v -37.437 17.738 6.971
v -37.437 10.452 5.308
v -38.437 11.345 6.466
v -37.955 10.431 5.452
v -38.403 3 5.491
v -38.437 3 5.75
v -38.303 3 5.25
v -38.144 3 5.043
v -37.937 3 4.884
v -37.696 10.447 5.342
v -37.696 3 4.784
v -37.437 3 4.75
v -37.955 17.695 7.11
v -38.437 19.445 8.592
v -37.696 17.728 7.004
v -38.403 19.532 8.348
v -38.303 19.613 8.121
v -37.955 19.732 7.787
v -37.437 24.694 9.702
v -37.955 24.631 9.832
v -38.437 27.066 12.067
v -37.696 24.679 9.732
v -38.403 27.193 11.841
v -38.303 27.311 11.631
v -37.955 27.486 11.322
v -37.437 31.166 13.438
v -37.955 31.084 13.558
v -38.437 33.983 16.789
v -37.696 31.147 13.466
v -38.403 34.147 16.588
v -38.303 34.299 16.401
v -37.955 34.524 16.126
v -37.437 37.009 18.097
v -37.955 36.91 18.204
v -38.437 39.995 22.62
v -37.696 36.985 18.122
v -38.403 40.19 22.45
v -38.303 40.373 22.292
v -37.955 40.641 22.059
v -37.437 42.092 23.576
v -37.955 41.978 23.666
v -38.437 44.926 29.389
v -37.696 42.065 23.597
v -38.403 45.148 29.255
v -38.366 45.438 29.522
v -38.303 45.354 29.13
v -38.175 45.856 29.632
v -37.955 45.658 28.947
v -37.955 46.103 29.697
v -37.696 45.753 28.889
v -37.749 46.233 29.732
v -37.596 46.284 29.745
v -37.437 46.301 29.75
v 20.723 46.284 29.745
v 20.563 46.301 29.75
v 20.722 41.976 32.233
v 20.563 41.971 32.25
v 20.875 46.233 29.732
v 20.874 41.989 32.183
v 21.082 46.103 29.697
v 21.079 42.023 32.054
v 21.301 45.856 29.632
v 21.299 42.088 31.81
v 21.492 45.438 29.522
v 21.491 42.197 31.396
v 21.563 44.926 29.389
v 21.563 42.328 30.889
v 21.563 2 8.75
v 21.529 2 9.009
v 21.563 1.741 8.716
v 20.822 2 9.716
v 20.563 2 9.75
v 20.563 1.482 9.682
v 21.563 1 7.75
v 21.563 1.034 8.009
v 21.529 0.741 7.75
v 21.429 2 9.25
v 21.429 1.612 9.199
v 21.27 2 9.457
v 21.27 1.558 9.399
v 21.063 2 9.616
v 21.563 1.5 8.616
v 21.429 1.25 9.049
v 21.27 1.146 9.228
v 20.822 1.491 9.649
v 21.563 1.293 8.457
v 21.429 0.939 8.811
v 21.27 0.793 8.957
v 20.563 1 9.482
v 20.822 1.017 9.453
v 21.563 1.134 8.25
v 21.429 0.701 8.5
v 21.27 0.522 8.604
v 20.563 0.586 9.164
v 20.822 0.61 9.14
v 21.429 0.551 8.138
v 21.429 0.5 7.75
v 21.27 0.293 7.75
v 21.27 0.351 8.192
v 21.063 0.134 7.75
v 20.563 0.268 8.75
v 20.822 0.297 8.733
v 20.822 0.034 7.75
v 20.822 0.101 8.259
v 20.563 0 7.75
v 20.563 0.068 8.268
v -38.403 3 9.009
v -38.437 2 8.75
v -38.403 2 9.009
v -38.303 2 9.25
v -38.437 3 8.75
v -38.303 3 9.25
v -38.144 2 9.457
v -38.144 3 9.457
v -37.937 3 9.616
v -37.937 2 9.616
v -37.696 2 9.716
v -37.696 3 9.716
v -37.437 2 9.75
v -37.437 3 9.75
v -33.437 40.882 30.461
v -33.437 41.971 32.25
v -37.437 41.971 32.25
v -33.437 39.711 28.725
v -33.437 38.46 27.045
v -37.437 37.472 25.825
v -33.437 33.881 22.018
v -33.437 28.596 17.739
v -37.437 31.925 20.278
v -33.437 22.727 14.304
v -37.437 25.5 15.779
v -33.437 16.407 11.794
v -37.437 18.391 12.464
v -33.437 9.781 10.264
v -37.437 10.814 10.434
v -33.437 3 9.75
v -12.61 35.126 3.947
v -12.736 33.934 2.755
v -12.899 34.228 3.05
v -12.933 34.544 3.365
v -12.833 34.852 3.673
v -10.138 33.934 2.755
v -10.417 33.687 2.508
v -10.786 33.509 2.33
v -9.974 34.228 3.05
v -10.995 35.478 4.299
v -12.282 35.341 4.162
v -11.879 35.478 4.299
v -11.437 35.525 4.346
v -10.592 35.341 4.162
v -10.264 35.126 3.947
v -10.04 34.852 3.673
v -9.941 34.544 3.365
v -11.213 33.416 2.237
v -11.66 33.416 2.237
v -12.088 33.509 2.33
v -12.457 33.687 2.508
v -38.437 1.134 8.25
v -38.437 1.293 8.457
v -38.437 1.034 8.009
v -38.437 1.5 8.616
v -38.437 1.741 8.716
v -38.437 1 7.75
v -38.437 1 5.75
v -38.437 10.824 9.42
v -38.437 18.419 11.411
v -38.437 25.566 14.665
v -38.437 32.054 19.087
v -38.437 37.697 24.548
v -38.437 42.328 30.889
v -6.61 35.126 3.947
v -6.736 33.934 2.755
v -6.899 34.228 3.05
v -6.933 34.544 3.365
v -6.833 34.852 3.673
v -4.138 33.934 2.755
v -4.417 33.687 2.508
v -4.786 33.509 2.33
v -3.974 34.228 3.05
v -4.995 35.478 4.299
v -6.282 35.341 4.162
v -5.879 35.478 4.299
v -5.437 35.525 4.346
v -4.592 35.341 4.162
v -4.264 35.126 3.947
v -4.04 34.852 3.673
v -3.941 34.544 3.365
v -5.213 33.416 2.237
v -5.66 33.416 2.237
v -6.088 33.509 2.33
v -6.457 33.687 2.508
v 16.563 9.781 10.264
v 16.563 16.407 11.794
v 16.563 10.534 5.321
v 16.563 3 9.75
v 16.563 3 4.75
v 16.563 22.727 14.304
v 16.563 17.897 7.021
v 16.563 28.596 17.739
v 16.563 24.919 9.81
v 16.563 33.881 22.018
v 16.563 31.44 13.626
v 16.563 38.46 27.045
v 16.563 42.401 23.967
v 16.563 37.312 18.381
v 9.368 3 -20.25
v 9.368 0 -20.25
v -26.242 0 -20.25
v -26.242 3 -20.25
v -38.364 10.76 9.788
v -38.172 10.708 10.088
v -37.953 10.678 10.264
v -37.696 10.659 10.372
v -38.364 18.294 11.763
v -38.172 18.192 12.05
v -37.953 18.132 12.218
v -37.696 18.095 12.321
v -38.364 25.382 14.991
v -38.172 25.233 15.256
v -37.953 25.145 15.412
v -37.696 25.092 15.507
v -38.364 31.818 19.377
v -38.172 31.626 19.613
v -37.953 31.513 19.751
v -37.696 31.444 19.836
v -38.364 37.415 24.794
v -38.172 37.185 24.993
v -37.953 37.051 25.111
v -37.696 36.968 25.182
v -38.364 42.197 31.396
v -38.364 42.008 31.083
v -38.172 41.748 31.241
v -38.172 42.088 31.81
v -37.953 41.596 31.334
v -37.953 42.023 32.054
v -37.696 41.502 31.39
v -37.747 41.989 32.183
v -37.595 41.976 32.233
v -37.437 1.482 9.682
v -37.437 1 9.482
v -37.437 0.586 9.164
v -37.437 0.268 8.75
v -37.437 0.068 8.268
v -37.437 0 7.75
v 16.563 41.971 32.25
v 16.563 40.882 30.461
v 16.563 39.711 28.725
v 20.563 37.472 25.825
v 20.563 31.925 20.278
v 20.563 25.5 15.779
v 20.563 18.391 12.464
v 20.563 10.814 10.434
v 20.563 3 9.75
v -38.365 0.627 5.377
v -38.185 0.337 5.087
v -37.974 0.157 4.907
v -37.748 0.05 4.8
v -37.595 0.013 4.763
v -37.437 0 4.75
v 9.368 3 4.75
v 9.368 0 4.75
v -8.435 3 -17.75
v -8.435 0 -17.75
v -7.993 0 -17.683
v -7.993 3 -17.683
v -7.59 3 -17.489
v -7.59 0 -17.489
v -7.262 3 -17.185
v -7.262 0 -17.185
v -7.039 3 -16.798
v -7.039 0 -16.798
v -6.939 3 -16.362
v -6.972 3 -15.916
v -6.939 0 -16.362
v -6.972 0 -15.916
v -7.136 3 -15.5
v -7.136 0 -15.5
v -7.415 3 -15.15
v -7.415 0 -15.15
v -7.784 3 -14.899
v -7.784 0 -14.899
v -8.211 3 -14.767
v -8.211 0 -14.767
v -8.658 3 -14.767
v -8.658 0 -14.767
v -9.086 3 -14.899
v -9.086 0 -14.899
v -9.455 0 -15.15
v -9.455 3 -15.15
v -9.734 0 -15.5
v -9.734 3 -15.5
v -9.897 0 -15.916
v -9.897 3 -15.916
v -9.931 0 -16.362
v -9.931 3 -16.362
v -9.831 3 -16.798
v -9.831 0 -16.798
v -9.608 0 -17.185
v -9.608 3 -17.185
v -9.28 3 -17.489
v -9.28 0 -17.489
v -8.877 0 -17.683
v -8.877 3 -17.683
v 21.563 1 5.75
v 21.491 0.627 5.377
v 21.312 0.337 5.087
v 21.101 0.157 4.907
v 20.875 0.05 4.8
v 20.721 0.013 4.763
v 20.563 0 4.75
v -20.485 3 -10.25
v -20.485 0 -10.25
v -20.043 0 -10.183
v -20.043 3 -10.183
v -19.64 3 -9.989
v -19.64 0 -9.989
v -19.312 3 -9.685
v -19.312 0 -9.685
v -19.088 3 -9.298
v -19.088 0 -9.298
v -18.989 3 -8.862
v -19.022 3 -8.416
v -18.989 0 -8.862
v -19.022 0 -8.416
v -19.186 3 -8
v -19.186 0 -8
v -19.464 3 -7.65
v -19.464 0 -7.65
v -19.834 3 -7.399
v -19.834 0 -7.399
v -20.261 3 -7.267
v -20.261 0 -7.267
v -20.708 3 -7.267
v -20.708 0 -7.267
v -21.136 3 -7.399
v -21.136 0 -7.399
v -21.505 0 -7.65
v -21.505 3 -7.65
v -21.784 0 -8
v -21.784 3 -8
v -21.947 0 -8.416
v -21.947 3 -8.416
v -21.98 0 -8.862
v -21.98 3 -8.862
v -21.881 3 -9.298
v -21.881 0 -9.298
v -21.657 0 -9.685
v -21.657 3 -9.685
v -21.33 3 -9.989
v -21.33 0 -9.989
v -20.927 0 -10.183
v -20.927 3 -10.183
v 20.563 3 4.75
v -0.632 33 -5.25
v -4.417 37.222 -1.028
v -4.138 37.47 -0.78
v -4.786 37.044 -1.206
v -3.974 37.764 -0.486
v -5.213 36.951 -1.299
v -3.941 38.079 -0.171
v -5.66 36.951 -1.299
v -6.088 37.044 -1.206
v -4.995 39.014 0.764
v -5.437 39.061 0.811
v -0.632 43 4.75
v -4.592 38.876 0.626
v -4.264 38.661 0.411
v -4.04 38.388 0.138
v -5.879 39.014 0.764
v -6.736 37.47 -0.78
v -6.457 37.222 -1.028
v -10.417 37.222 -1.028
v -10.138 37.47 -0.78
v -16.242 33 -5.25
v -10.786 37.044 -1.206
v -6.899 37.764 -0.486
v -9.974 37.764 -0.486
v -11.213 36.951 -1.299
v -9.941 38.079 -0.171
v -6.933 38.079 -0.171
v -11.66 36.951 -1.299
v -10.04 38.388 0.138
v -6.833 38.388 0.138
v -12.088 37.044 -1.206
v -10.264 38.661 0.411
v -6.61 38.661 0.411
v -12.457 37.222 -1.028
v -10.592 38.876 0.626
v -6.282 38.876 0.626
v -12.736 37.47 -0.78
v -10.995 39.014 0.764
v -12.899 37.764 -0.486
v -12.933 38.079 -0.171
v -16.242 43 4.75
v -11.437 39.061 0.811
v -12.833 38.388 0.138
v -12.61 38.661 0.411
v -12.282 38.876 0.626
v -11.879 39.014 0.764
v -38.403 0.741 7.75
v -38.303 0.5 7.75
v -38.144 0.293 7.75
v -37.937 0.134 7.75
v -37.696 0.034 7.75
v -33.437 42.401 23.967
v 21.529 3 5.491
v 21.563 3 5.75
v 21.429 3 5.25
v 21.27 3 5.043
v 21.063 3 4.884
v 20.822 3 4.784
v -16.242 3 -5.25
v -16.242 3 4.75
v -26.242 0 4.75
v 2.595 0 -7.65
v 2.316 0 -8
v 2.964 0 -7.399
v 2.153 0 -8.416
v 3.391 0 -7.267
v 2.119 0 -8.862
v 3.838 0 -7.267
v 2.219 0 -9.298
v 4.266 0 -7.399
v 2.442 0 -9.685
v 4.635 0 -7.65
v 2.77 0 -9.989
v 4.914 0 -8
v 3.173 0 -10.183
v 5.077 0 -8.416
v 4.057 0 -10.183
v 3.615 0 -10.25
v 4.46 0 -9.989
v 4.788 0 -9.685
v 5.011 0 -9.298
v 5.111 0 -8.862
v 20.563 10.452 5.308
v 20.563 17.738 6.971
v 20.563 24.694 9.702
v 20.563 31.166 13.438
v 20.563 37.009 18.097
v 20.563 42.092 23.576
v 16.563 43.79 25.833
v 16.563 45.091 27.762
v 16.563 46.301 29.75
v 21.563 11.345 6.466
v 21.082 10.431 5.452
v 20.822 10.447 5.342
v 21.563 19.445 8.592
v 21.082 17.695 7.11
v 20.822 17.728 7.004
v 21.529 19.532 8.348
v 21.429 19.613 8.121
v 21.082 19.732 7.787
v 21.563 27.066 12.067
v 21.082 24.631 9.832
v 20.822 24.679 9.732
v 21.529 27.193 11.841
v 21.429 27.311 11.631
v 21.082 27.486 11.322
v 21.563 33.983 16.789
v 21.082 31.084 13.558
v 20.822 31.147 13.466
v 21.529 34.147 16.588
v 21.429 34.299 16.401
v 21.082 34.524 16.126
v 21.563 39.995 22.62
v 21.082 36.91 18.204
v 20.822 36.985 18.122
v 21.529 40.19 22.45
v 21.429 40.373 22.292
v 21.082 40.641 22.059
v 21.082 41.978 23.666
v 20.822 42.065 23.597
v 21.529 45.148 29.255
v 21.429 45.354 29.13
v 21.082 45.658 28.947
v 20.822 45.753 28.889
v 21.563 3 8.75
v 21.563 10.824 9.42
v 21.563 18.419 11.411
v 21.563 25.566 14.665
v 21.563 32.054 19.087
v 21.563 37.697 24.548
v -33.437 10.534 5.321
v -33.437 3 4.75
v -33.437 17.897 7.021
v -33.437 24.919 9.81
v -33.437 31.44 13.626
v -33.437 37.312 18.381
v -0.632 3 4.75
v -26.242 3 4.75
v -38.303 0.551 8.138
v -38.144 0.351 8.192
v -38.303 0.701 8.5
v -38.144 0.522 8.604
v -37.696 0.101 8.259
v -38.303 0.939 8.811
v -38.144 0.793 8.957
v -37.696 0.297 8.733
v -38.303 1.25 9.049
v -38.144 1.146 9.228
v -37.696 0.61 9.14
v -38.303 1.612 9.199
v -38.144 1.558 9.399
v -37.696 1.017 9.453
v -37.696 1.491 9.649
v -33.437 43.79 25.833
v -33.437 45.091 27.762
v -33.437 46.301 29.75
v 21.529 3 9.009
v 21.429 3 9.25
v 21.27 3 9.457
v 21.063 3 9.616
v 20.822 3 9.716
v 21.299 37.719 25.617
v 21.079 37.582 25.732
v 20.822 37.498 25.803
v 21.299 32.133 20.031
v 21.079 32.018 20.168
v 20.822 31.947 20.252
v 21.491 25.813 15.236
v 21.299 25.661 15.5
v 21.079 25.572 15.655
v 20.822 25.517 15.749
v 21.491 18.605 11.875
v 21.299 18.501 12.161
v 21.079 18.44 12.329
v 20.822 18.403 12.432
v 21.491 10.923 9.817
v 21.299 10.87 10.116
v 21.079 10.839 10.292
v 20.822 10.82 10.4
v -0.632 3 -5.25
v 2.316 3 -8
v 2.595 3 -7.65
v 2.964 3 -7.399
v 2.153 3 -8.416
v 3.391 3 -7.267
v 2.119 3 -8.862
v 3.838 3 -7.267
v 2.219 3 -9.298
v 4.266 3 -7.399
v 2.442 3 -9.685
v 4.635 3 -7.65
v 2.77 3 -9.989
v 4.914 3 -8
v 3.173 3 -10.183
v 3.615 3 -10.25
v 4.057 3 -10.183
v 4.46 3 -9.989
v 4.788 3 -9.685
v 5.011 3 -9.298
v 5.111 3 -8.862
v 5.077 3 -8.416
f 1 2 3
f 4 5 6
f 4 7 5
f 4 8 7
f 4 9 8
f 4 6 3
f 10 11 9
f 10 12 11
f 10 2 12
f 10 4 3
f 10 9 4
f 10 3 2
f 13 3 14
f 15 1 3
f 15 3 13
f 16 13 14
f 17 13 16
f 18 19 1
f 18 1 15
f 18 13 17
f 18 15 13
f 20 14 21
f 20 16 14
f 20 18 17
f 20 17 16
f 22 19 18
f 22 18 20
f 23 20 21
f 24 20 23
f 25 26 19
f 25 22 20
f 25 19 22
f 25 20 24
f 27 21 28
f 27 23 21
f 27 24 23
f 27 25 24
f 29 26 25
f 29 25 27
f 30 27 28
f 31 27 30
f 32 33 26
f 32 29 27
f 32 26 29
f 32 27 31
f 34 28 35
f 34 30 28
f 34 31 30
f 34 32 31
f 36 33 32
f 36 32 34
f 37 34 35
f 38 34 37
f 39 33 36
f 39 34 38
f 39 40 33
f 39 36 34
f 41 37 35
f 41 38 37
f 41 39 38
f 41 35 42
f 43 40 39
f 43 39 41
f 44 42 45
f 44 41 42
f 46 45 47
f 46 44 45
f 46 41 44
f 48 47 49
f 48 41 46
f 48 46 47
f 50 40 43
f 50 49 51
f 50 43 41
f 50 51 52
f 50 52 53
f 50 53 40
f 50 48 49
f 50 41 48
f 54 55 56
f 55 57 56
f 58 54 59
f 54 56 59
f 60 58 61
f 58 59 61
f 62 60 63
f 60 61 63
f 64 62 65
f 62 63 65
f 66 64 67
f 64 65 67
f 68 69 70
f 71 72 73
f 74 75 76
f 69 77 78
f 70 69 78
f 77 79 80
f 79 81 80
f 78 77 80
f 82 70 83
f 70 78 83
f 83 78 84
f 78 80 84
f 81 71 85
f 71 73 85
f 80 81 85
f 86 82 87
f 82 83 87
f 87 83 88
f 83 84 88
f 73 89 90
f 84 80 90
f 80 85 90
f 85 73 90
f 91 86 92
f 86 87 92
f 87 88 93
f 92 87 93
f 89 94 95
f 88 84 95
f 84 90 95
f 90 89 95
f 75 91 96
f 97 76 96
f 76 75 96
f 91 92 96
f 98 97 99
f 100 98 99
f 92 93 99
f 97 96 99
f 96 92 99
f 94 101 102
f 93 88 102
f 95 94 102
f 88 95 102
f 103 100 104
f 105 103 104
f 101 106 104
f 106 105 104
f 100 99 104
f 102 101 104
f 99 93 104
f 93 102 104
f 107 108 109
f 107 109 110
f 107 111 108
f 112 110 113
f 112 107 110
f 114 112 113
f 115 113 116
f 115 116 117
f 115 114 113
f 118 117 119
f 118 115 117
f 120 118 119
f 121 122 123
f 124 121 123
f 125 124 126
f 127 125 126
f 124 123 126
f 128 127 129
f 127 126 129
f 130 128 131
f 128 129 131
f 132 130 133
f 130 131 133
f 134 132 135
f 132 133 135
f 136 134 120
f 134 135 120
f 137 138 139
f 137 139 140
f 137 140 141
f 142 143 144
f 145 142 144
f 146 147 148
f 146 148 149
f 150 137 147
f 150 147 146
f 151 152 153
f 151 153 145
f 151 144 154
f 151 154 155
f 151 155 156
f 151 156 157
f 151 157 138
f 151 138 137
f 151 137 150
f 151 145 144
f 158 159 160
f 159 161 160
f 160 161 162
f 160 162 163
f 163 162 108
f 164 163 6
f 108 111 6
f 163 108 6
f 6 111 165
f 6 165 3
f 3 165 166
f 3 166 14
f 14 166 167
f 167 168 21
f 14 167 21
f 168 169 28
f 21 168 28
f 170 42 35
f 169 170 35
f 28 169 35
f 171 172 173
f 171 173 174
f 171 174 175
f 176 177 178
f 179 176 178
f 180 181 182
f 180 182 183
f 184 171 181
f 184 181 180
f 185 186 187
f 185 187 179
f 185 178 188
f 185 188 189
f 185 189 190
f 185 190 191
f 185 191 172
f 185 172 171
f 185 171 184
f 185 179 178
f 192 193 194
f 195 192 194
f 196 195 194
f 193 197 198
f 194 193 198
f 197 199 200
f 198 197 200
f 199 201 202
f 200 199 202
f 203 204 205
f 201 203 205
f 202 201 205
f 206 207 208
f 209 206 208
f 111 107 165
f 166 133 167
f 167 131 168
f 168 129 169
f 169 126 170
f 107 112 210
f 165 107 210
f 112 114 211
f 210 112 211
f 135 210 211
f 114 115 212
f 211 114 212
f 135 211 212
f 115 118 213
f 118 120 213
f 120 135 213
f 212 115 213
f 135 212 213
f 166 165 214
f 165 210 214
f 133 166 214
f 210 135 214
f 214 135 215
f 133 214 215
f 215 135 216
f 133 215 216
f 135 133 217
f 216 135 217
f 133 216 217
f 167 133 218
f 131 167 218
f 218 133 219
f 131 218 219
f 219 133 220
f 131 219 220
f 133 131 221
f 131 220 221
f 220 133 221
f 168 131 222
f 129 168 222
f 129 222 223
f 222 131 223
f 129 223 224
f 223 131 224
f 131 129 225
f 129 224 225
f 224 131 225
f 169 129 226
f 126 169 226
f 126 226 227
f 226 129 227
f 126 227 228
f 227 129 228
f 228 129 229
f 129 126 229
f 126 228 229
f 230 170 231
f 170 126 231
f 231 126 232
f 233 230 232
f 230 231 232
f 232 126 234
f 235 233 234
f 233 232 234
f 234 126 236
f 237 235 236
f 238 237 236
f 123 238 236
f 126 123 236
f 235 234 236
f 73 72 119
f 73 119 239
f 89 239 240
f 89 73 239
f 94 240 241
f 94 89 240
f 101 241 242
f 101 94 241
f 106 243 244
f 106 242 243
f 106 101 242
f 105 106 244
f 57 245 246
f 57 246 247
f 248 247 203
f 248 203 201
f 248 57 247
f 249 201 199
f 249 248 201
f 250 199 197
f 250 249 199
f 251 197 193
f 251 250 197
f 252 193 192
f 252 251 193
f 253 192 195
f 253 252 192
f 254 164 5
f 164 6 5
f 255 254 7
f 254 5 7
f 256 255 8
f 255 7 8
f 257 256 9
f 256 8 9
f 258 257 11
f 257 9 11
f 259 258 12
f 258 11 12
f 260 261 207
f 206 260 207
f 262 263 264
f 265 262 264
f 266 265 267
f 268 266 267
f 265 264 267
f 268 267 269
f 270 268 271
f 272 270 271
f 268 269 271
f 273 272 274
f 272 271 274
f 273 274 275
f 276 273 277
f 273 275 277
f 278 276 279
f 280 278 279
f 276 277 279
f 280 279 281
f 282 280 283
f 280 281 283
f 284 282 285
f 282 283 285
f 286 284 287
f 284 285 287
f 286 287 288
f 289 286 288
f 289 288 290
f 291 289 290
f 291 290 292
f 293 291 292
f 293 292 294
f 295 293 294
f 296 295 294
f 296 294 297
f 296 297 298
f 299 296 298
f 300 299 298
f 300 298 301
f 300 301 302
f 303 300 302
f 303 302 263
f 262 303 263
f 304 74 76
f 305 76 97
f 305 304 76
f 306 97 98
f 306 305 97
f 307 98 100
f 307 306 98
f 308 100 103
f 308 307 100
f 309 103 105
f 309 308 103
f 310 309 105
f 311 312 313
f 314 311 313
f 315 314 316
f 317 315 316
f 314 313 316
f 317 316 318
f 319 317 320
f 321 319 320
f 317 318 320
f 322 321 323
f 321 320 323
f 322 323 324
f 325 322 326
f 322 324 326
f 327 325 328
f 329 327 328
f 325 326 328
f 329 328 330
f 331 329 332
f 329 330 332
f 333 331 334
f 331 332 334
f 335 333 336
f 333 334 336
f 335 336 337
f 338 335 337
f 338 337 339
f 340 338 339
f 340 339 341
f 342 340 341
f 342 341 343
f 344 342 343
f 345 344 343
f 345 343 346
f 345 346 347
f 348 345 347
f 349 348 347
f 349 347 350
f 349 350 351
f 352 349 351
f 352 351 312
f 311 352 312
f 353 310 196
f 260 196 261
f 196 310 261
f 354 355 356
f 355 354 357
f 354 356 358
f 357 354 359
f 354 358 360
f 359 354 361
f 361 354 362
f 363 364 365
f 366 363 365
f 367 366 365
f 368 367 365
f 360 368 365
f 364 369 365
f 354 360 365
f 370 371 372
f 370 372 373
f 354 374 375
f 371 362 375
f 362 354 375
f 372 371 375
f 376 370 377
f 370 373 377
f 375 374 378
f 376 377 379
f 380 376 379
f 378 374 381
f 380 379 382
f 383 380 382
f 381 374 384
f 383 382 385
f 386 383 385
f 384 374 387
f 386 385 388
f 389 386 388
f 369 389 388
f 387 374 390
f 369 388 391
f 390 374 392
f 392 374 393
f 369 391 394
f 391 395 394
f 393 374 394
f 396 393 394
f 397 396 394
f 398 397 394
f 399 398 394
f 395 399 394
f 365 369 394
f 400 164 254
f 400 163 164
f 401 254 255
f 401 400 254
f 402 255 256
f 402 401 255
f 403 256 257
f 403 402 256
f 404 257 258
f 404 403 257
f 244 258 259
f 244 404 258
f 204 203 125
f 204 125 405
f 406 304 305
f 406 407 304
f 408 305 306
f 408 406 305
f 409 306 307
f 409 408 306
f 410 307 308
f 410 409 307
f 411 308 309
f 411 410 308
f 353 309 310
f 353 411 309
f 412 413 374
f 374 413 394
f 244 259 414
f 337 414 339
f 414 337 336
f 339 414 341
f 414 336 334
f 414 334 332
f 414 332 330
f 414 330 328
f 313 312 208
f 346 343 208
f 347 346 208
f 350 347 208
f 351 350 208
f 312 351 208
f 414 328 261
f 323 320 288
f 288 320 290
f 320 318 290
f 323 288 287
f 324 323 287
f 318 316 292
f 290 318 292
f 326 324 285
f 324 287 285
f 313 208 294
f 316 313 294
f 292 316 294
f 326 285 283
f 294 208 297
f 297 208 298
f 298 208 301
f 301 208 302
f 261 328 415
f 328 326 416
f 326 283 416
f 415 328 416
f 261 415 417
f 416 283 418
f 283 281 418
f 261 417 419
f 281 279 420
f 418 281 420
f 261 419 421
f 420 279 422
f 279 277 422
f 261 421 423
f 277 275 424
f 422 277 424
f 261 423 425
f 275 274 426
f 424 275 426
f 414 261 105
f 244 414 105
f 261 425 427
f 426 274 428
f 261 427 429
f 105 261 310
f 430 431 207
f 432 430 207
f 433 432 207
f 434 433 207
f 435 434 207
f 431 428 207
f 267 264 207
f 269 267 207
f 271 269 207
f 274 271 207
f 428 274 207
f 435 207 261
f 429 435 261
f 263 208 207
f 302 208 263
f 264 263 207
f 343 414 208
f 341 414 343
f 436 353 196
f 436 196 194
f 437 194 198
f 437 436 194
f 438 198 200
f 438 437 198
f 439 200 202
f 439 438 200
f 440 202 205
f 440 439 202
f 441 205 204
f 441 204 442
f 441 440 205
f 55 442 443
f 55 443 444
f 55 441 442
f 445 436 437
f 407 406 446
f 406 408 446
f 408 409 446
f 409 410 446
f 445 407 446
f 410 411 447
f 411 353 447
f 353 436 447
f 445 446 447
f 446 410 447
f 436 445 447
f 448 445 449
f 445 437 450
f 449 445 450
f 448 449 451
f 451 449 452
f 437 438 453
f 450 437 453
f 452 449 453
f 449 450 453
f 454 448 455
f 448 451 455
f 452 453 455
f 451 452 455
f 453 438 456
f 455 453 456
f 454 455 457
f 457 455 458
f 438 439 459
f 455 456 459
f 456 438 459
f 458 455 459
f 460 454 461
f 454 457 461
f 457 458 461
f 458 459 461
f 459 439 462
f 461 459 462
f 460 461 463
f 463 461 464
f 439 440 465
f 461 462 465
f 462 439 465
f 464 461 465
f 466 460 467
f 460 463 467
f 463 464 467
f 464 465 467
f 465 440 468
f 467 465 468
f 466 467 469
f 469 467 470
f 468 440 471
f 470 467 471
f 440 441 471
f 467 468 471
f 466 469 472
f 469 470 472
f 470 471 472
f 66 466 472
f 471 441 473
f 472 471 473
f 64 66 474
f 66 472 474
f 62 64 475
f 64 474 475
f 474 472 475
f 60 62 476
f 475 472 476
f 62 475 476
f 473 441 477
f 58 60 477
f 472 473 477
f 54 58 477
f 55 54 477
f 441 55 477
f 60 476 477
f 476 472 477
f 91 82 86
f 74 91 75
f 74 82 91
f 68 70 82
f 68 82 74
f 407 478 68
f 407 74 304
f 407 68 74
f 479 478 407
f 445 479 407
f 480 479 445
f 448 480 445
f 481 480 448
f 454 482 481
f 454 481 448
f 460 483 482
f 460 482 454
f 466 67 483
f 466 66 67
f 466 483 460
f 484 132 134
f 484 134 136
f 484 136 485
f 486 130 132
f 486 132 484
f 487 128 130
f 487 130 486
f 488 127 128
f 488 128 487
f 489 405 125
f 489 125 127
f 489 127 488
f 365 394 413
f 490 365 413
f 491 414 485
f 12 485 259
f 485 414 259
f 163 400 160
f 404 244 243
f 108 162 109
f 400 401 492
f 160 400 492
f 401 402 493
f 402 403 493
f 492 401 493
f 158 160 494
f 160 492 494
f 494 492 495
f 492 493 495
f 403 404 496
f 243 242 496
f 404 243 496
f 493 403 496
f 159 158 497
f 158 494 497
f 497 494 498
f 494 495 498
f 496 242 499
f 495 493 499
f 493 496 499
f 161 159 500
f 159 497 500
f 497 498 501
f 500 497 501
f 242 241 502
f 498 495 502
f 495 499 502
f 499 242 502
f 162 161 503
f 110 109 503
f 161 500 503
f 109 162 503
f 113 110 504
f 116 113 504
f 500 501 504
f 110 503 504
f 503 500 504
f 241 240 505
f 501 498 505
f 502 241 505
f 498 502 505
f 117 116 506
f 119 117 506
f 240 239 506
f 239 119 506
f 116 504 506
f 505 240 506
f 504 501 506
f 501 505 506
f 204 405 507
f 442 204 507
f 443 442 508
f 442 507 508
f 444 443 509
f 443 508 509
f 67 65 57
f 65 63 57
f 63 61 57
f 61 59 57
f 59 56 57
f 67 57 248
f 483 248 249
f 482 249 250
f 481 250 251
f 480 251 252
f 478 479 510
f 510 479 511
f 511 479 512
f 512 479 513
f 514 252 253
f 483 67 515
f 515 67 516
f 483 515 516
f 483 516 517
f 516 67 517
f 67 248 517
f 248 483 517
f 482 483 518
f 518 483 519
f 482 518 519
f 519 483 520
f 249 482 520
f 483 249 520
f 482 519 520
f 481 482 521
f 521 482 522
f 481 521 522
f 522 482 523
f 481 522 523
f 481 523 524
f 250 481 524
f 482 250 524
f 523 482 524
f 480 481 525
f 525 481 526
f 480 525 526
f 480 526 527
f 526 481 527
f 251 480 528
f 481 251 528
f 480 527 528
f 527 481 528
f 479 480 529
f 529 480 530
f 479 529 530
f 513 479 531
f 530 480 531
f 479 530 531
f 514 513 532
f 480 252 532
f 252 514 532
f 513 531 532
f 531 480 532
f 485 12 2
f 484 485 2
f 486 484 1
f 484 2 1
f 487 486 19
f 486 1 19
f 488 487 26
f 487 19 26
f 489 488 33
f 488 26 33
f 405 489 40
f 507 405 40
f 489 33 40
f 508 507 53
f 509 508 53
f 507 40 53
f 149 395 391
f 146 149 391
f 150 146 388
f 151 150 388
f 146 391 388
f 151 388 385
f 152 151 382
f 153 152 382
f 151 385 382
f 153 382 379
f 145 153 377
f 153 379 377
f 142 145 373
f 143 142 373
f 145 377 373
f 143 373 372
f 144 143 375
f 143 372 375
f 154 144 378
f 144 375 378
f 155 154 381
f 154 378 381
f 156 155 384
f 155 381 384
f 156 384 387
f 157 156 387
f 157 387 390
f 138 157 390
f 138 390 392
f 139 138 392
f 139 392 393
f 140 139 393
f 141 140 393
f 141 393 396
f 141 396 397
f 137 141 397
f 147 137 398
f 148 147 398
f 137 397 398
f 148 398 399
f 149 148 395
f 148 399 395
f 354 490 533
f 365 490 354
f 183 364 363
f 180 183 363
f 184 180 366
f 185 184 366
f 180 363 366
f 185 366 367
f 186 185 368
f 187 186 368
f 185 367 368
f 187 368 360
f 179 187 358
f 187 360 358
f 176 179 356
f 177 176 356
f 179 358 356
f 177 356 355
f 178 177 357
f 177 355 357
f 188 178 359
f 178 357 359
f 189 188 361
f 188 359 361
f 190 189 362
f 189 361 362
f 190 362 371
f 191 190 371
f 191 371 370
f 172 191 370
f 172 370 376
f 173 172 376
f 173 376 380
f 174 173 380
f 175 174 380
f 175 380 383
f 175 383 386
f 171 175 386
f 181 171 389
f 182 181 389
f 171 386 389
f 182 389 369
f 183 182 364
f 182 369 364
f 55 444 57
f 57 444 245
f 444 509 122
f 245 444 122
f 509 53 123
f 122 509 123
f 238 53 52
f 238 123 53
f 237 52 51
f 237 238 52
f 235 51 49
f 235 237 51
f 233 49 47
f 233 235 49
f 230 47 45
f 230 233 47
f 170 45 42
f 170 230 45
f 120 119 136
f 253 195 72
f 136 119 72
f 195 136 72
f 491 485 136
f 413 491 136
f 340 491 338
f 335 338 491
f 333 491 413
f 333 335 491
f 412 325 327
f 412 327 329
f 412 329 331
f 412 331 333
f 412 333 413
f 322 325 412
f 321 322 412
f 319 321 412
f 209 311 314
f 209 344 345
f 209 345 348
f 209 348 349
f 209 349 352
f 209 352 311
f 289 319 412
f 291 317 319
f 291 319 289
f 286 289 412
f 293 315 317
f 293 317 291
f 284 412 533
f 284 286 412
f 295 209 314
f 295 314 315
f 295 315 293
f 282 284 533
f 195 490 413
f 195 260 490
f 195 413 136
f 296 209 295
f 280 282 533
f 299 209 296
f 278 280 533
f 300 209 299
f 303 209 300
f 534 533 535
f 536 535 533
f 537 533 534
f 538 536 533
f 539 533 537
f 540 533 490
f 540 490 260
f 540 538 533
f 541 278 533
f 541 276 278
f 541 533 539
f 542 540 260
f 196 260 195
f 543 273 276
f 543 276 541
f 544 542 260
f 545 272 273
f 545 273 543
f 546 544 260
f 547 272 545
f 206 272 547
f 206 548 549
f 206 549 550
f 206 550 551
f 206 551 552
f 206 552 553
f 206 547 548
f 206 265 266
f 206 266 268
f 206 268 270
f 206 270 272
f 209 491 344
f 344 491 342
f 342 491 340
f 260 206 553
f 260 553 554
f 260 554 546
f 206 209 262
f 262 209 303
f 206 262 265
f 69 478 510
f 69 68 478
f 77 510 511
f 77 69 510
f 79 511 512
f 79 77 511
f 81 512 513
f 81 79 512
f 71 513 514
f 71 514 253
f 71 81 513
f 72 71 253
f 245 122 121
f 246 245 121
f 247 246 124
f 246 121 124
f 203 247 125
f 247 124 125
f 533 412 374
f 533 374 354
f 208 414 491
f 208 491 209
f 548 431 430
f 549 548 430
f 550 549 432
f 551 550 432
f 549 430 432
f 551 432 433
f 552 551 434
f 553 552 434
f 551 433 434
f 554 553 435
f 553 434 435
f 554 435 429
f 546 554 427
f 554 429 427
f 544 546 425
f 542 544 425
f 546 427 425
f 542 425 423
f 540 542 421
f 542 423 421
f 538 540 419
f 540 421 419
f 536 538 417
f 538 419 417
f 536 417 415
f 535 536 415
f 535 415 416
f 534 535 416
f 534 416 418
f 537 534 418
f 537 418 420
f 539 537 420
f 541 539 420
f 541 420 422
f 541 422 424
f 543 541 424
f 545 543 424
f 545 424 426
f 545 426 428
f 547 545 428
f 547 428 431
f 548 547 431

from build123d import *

# Parameters (mm, degrees)
SKETCH1_W           = 17.805
SKETCH1_H           = 25
BOSS_EXTRUDE1_DEPTH = 3
FILLET1_R           = 2
BOSS_EXTRUDE3_DEPTH = 5
SKETCH3_R           = 1.5
CUT_EXTRUDE1_DEPTH  = 5
SKETCH7_W           = 15.61
SKETCH7_H           = 10
BOSS_EXTRUDE4_DEPTH = 30
BOSS_EXTRUDE5_DEPTH = 15.61
SKETCH9_R           = 1.5
CUT_EXTRUDE2_DEPTH  = 5
BOSS_EXTRUDE6_DEPTH = 50
FILLET2_R           = 1


with BuildPart() as part:
    # Sketch1 → Boss-Extrude1 (new body)
    with BuildSketch(Plane(origin=(0, 0, 0), x_dir=(1, 0, 0), z_dir=(0, 1, 0))):
        Polygon((9.368218391, -4.75), (-8.436781609, -4.75), (-26.241781609, -4.75), (-38.436781609, -4.75), (-38.436781609, -9.75), (21.563218391, -9.75), (21.563218391, -4.75), align=None)
        with Locations((0.465718391, 7.75)):
            Rectangle(SKETCH1_W, SKETCH1_H)
        with Locations((-17.339281609, 7.75)):
            Rectangle(SKETCH1_W, SKETCH1_H)
    extrude(amount=BOSS_EXTRUDE1_DEPTH)

    # Fillet1
    fillet1_edges = [part.edges().sort_by_distance(p)[0] for p in [
        (-8.436781609, 0, 9.75),
    ]]
    fillet(fillet1_edges, radius=FILLET1_R)

    # Sketch2 → Boss-Extrude3 (add)
    with BuildSketch(Plane(origin=(21.563218391, 0, 0), x_dir=(0, 0, -1), z_dir=(1, 0, 0))):
        with BuildLine():
            Line((-29.75, 46.301270189), (-32.25, 41.97114317))
            ThreePointArc((-32.25, 41.97114317), (-15.77885683, 25.5), (-9.75, 3))
            Line((-9.75, 3), (-4.75, 3))
            ThreePointArc((-4.75, 3), (-11.448729811, 28), (-29.75, 46.301270189))
        make_face()
    boss_extrude3 = extrude(amount=-BOSS_EXTRUDE3_DEPTH)

    # Mirror3: Boss-Extrude3 across plane
    add(boss_extrude3.mirror(Plane(origin=(-8.436781609, 0, 0), x_dir=(0, 0, 1), z_dir=(1, 0, 0))))

    # Sketch3 → Cut-Extrude1 (cut)
    with BuildSketch(Plane.XZ):
        with Locations(Location((-20.484687418, -8.75, 0), (0, 0, 270))):
            Circle(SKETCH3_R)
        with Locations(Location((-8.434877213, -16.25, 0), (0, 0, 270))):
            Circle(SKETCH3_R)
        with Locations(Location((3.614932992, -8.75, 0), (0, 0, 270))):
            Circle(SKETCH3_R)
    extrude(amount=-CUT_EXTRUDE1_DEPTH, mode=Mode.SUBTRACT)

    # Sketch7 → Boss-Extrude4 (add)
    with BuildSketch(Plane(origin=(0, 3, 0), x_dir=(1, 0, 0), z_dir=(0, 1, 0))):
        with Locations((-8.436781609, 0.25)):
            Rectangle(SKETCH7_W, SKETCH7_H)
    extrude(amount=BOSS_EXTRUDE4_DEPTH)

    # Sketch8 → Boss-Extrude5 (add)
    with BuildSketch(Plane.ZY.offset(16.241781609)):
        Polygon((-5.25, 33), (4.75, 43), (4.75, 33), align=None)
    extrude(amount=-BOSS_EXTRUDE5_DEPTH)

    # Sketch9 → Cut-Extrude2 (cut)
    with BuildSketch(Plane(origin=(0, 19.125, -19.125), x_dir=(1, 0, 0), z_dir=(0, 0.7071067811865461, -0.7071067811865489))):
        with Locations(Location((-11.436781609, -26.69328099, 0), (0, 0, 270))):
            Circle(SKETCH9_R)
        with Locations(Location((-5.436781609, -26.69328099, 0), (0, 0, 270))):
            Circle(SKETCH9_R)
    extrude(amount=-CUT_EXTRUDE2_DEPTH, mode=Mode.SUBTRACT)

    # Sketch10 → Boss-Extrude6 (add)
    with BuildSketch(Plane(origin=(-33.436781609, 0, 0), x_dir=(0, 0, -1), z_dir=(1, 0, 0))):
        with BuildLine():
            Line((-27.04523361, 38.460483912), (-23.966926234, 42.40053768))
            ThreePointArc((-23.966926234, 42.40053768), (-26.790354826, 44.451878628), (-29.75, 46.301270189))
            Line((-29.75, 46.301270189), (-32.25, 41.97114317))
            ThreePointArc((-32.25, 41.97114317), (-29.586319344, 40.306690765), (-27.04523361, 38.460483912))
        make_face()
    extrude(amount=BOSS_EXTRUDE6_DEPTH)

    # Fillet2
    fillet2_edges = [part.edges().sort_by_distance(p)[0] for p in [
        (-38.436781609, 0, 6.25),
        (21.563218391, 0, 6.25),
        (21.563218391, 2.5, 9.75),
        (-38.436781609, 2.5, 9.75),
        (-38.436781609, 1.5, 4.75),
        (21.563218391, 1.5, 4.75),
        (21.563218391, 0.585786438, 9.164213562),
        (-38.436781609, 0.585786438, 9.164213562),
        (21.563218391, 25.5, 15.77885683),
        (21.563218391, 28, 11.448729811),
        (21.563218391, 44.13620668, 31),
        (-38.436781609, 25.5, 15.77885683),
        (-38.436781609, 28, 11.448729811),
        (-38.436781609, 44.13620668, 31),
    ]]
    fillet(fillet2_edges, radius=FILLET2_R)


solid = part.part
